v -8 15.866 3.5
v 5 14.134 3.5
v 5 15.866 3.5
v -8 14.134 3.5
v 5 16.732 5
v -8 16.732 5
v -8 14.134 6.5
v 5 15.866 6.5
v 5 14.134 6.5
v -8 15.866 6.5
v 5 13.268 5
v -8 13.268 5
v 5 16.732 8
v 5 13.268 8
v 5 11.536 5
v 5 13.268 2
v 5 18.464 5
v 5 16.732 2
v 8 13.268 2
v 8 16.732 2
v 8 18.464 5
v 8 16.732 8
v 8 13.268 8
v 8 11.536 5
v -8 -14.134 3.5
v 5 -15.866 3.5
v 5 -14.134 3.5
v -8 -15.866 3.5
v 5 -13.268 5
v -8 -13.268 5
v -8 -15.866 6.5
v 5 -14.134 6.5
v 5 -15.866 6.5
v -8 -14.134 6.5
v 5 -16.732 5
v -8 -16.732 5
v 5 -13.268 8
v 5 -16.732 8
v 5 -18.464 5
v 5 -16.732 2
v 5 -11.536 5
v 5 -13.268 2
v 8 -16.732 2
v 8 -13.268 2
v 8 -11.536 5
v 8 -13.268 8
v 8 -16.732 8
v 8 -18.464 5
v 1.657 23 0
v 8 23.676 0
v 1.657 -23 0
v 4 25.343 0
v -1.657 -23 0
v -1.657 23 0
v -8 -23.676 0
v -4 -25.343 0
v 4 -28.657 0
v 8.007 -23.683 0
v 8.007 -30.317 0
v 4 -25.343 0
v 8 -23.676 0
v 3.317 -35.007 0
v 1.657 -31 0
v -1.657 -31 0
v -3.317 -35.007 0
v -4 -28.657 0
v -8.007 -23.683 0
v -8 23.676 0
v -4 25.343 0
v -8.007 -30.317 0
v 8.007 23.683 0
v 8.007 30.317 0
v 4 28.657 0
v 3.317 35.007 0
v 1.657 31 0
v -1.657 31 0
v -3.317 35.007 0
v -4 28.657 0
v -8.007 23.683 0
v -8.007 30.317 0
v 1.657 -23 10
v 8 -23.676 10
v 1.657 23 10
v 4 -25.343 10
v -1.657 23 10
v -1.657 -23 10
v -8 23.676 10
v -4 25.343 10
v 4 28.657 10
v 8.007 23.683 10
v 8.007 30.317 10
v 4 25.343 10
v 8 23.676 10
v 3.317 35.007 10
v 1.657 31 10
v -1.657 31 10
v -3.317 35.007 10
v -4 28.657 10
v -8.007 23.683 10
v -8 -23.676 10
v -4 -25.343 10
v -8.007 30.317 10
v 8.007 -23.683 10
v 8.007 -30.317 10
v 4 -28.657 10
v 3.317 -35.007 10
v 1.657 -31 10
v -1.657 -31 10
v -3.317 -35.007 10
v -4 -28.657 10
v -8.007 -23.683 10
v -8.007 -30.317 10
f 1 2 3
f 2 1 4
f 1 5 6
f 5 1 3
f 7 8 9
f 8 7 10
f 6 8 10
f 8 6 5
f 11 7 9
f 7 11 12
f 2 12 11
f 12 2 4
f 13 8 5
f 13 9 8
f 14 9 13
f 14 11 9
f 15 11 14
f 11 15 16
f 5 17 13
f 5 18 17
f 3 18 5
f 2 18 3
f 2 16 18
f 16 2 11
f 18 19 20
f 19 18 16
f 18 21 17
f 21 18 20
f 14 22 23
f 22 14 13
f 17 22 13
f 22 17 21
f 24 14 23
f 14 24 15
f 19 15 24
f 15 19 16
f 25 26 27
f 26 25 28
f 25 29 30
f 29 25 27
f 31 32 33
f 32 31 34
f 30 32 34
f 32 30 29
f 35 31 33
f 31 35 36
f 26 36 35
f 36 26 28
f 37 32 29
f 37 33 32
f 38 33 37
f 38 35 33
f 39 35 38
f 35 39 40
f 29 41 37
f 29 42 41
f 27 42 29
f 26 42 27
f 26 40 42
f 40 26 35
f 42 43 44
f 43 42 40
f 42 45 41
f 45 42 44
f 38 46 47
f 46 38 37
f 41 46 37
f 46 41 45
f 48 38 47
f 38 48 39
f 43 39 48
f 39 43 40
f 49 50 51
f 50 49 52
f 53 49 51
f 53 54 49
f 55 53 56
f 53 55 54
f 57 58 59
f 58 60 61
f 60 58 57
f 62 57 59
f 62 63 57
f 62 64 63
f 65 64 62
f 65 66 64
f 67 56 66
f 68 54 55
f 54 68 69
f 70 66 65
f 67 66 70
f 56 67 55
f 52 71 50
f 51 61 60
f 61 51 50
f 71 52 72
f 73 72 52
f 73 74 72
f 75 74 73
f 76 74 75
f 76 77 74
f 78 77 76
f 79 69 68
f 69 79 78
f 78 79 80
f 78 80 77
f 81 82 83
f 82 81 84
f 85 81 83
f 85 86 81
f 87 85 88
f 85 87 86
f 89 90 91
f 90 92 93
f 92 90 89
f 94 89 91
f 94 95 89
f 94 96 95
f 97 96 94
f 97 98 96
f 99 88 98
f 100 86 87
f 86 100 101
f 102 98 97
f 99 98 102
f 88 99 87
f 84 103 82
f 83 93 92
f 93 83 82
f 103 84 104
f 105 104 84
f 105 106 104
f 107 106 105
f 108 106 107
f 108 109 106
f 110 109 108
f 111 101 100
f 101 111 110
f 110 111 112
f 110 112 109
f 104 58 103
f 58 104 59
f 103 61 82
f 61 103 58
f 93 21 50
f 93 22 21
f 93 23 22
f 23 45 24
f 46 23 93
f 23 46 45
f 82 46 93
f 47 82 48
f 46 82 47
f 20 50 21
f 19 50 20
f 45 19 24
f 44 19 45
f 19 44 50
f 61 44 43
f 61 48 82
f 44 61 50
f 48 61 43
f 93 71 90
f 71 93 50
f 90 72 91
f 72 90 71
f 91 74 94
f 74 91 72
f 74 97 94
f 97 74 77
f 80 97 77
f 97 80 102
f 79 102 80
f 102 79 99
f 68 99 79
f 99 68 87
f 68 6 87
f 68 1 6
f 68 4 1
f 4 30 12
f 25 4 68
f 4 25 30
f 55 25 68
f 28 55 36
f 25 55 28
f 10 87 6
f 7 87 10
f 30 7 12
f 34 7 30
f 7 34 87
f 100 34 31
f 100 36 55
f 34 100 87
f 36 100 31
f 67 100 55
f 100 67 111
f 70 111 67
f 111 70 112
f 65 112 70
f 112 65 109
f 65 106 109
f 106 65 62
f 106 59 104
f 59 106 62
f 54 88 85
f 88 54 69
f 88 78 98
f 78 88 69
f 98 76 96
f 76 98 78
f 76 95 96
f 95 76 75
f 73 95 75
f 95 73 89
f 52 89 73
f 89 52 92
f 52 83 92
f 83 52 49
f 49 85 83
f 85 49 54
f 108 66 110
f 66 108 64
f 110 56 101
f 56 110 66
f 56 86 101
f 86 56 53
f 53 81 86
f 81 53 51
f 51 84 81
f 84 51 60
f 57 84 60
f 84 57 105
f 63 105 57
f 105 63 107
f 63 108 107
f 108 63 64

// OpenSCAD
// file: base_end_2off.scad
include <settings.scad>;

!base_end();

module base_end() difference() {
	linear_extrude(height = end_height, convexity = 5) difference() {
		square([yz_motor_distance + motor_casing - motor_screw_spacing + 10, motor_casing + rod_size * 4], center = true);
		for(end = [1, -1]) {
			for(side = [1, -1]) translate([end * (yz_motor_distance + motor_casing - motor_screw_spacing) / 2, side * motor_screw_spacing / 2, 0]) circle(m3_size * da6, $fn = 6);
			translate([end * (yz_motor_distance + motor_casing) / 2, 0, 0]) circle(motor_screw_spacing / 2);
		}
	}
	for(end = [1, -1]) translate([end * (yz_motor_distance + motor_casing) / 2, 0, 3]) linear_extrude(height = end_height, convexity = 5) square(motor_casing, center = true);
	for(side = [1, -1]) translate([0, side * (motor_casing / 2 + rod_size), rod_size / 2 + bearing_size / 2]) rotate([90, 180 / 8, 90]) {
		cylinder(r = rod_size * da8, h = yz_motor_distance + motor_casing + 20, center = true, $fn = 8);
		%translate([0, 0, -70]) cylinder(r = rod_size * da8, h = 200, center = true, $fn = 8);
	}
	translate([0, 0, end_height]) scale([1, 1, .5]) rotate([90, 0, 90]) cylinder(r = motor_casing / 2, h = yz_motor_distance + 20, center = true);
	translate([yz_motor_distance / 2 - rod_size, 0, 0]) {
		translate([0, 0, -3]) linear_extrude(height = end_height - motor_casing / 4, convexity = 5) {
			rotate(180 / 8) circle(rod_size * da8, $fn = 8);
			translate([0, -rod_size / 4, 0]) square([rod_size * .6, rod_size / 2]);
		}
		// z axis clamping
		for(h = [8, end_height - motor_casing / 4 - 8]) translate([0, 0, h]) rotate([90, 0, 90]) {
			cylinder(r = m3_size * da6, h = yz_motor_distance + motor_casing, center = true, $fn = 6);
			translate([0, 0, -rod_size / 2 - 3]) cylinder(r = m3_nut_size* da6, h = yz_motor_distance + motor_casing, $fn = 6);
			translate([0, 0, 0]) cylinder(r = m3_nut_size / 2 + 0.5, h = yz_motor_distance + motor_casing, $fn = 6);
			translate([0, 0, -rod_size / 2 - 8]) rotate([0, 180, 0]) cylinder(r = m3_size * da6 * 2, h = yz_motor_distance + motor_casing, $fn = 6);
		}
	}
	translate([-yz_motor_distance / 2 + bearing_size / 2, 0, -bearing_size * sqrt(2) / 4]) rotate([90, -45, 0]) {
		%cylinder(r = rod_size * da8, h = 100, center = true, $fn = 8);
		for(side = [0, 1]) mirror([0, 0, side]) translate([0, 0, rod_size / 2 + 2]) {
			cylinder(r = bearing_size / 2, h = bearing_length, center = false, $fn = 80);
			cube([bearing_size / 2, bearing_size / 2, bearing_length]);
		}
	}
	translate([0, 0, end_height - rod_size * 1.5]) rotate([90, 180 / 8, 0]) cylinder(r = rod_size * da8, h = motor_casing + rod_size * 5, $fn = 8, center = true);
	%translate([0, 0, end_height - rod_size * 1.5]) rotate([90, 180 / 8, 0]) cylinder(r = rod_size * da8, h = 100, $fn = 8, center = true);
}
// file: y_bearing_retainers.scad
include <settings.scad>;

!for(b = [0:1]) mirror([0, b, 0]) for(a = [-1,1]) translate([a * bearing_size / 4, bearing_size - (bearing_size * 2/3) * a, 0]) rotate(90 + 90 * a) y_bearing_retainer();

module y_bearing_retainer() intersection() {
	difference() {
		linear_extrude(height = 10, convexity = 5) difference() {
			union() {
				intersection() {
					translate([-yz_motor_distance / 2 + bearing_size / 2, 0, 0]) circle(bearing_size / 2 + 4);
					translate([-yz_motor_distance / 2 + bearing_size / 2 - bearing_size / 2 - 4, -bearing_size, 0]) square([bearing_size + 8, bearing_size]);
				}
				translate([-yz_motor_distance / 2 + bearing_size / 2 - bearing_size / 2 - 4, 0, 0]) square([bearing_size + 8, bearing_size * sqrt(2) / 4 - 1]);
				translate([0, bearing_size * sqrt(2) / 4 - 3, 0]) square([yz_motor_distance + motor_casing - motor_screw_spacing + 10, 4], center = true);
			}
			translate([-yz_motor_distance / 2 + bearing_size / 2, 0, 0]) circle(bearing_size / 2);
			translate([-yz_motor_distance / 2 + bearing_size / 2 - bearing_size / 2, 0, 0]) square(bearing_size);
		}
		//screw holes
		for(side = [1, -1]) translate([side * (yz_motor_distance + motor_casing - motor_screw_spacing) / 2, 0, 5]) rotate(90) rotate([90, 0, 90]) {
			cylinder(r = m3_size * da6, h = bearing_size, center = true, $fn = 6);
			translate([0, 0, bearing_size * sqrt(2) / 4 - 5]) rotate([180, 0, 0]) cylinder(r = m3_size, h = bearing_size, $fn = 30);
		}
	}
	translate([0, 0, 5]) rotate(90) rotate([90, 0, 90]) cylinder(r = (yz_motor_distance + motor_casing - motor_screw_spacing + 10) / 2, h = bearing_size + 10, center = true, $fn = 6);
}
// file: bed_mounts.scad
include <settings.scad>;

!for(b = [0:1]) mirror([0, b, 0]) for(a = [-1,1]) translate([a * -7.5, 18 - 5 * a, 0]) rotate(180 + 90 * a) bed_mount();

module bed_mount() difference() {
	linear_extrude(height = 10, convexity = 5) difference() {
		union() {
			rotate(180 / 8) circle((rod_size + 8) * da8, $fn = 8);
			translate([0, -rod_size / 2 - 4, 0]) square([rod_size / 2 + 8, max(rod_size + 8, rod_size / 2 + 4 + bed_mount_height)]);
		}
		rotate(180 / 8) circle(rod_size * da8, $fn = 8);
		translate([0, -rod_size / (1 + sqrt(2)) / 2, 0]) square([rod_size + 10, rod_size / (1 + sqrt(2))]);
	}
	translate([rod_size / 2 + 1.5, -rod_size / 2 - 6, 5]) rotate([-90, 0, 0]) {
		cylinder(r = m3_size * da6, h = max(rod_size + 12, rod_size / 2 + 7 + bed_mount_height, $fn = 6));
		cylinder(r = m3_nut_size * da6, h = 4, $fn = 6);
	}
}
// file: x_end_left.scad
include <settings.scad>;

!x_end(0);

module x_end(motor = 0) mirror([(motor == 0) ? 1 : 0, 0, 0]) difference() {
	union() {
		if(motor > 0) translate([-(motor_casing / 2 + rod_size + bearing_size + 8) / 2 - motor_casing, 8 + rod_size, 0]) rotate([90, 0, 0]) {
			// Motor holder
			linear_extrude(height = 7) difference() {
				square([motor_casing + 3, x_rod_spacing + 8 + rod_size]);
				translate([motor_casing / 2, (x_rod_spacing + 8 + rod_size) / 2, 0]) {
					circle(motor_screw_spacing / 2);
					for(x = [1, -1]) for(y = [1, -1]) translate([x * motor_screw_spacing / 2, y * motor_screw_spacing / 2, 0]) circle(m3_size * da6, $fn = 6);
					translate([-(motor_casing * 1.5 - motor_screw_spacing), (motor > 1) ? (motor_casing / 2 - motor_screw_spacing) : 0, 0]) square([motor_casing, x_rod_spacing + 8 + rod_size]);
				}
			}
			// Belt
			%translate([motor_casing / 2, (x_rod_spacing + 8 + rod_size) / 2, rod_size / 2 - 2 - bearing_size / 2 - 2 - idler_pulley_width / 2]) rotate([180, 0, 0]) linear_extrude(height = 5, convexity = 5) difference() {
				union() {
					circle(pulley_size / 2 + 2);
					translate([0, -pulley_size / 2 - 2, 0]) square([200.5, pulley_size + 4]);
					translate([200.5, 0, 0]) circle(pulley_size / 2 + 2);
				}
				circle(pulley_size / 2);
				translate([0, -pulley_size / 2, 0]) square([200.5, pulley_size]);
				translate([200.5, 0, 0]) circle(pulley_size / 2);
			}

		}
		linear_extrude(height = x_rod_spacing + 8 + rod_size, convexity = 5) difference() {
			union() {
				for(side = [1, -1]) translate([side * (motor_casing / 4 + rod_size / 2), 0, 0]) circle(bearing_size / 2 + 3, $fn = 30);
				square([motor_casing / 2 + rod_size, bearing_size / 2 + 3], center = true);
				translate([-(motor_casing / 2 + rod_size + bearing_size + 6) / 2, 0, 0]) square([(motor_casing / 2 + rod_size + bearing_size / 2 + 3 + 3) / 2, bearing_size / 2 + 4 + rod_size / 2]);
				translate([-(motor_casing / 2 + rod_size + bearing_size + 6) / 2, 0, 0]) square([motor_casing / 2 + rod_size + bearing_size / 2 + 3 + 3, bearing_size / 2 + 3 + rod_size / 2]);
				translate([-(motor_casing / 2 + rod_size + bearing_size + 6) / 2 + rod_size / 2 + 2, 0, 0]) square([(motor_casing / 2 + rod_size + bearing_size + 6) / 2 + 5 - rod_size / 2 - 2, bearing_size / 2 + 6 + rod_size]);
				translate([-(motor_casing / 2 + rod_size + bearing_size + 6) / 2 + rod_size / 2 + 2, bearing_size / 2 + rod_size / 2 + 4, 0]) circle(rod_size / 2 + 2);
				translate([0, bearing_size / 2 + rod_size + 6, 0]) square(10, center = true);
			}
			square([motor_casing / 2 + rod_size, 3], center = true);
			translate([(motor_casing / 4 + rod_size / 2), 0, 0]) circle(bearing_size / 2 - .5, $fn = 30);
			translate([-(motor_casing / 4 + rod_size / 2), 0, 0]) circle(rod_nut_size * 6/14, $fn = 6);
			translate([4 + rod_size / 2, bearing_size / 2 + rod_size / 2 + 3, 0]) {
				square([motor_casing / 2 + rod_size + bearing_size + 8, rod_size / 2], center = true);
				translate([-(motor_casing / 2 + rod_size + bearing_size + 8) / 2, .5, 0]) circle(rod_size / 4 + .5, $fn = 12);
			}
		}
	}
	translate([0, 0, (x_rod_spacing + rod_size + 8) / 2]) {
		for(end = [0, 1]) mirror([0, 0, end]) translate([motor_casing / 4 + rod_size / 2, 0, -(x_rod_spacing + rod_size + 8) / 2 - 1]) cylinder(r = bearing_size / 2 - .05, h = bearing_length, $fn = 30);
		for(side = [1, -1]) render(convexity = 5) translate([0, bearing_size / 2 + rod_size / 2 + 3, side * x_rod_spacing / 2]) rotate([0, 90, 0]) {
			//cylinder(r = rod_size / 2, h = motor_casing / 2 + rod_size + bearing_size + 10, center = true, $fn = 30);
			difference() {
				translate([0, 0, (motor > -1) ? rod_size / 2 + 2 : 0]) intersection() {
					rotate(45) cube([rod_size + 2, rod_size + 2, motor_casing / 2 + rod_size + bearing_size + 10], center = true);
					cube([rod_size * 2, rod_size + 2, motor_casing / 2 + rod_size + bearing_size + 10], center = true);
				}
				translate([0, rod_size, 0]) cube([rod_size * 2, rod_size * 2, 6], center = true);
				for(end = [1, -1]) translate([0, -rod_size, end * (motor_casing / 4 + rod_size / 2)]) cube([rod_size * 2, rod_size * 2, 6], center = true);
			}
			translate([0, 0, rod_size / 2 + 2]) intersection() {
				rotate(45) cube([rod_size, rod_size, motor_casing / 2 + rod_size + bearing_size + 10], center = true);
				cube([rod_size * 2, rod_size + 1, motor_casing / 2 + rod_size + bearing_size + 10], center = true);
			}
		}
		// holes for clamping screws
		rotate([90, 0, 0]) {
			cylinder(r = m3_size * da6, h = 100, center = true, $fn = 6);
			translate([0, 0, bearing_size / 4 + .5]) cylinder(r = m3_nut_size * da6, h = 100, center = false, $fn = 6);
		}
	}
	translate([-(motor_casing / 4 + rod_size / 2), 0, 5]) rotate(90) cylinder(r = rod_nut_size / 2, h = x_rod_spacing + 8 + rod_size, $fn = 6);
	translate([(motor_casing / 4 + rod_size / 2), 0, 5]) %rotate(180 / 8) cylinder(r = rod_size * da8, h = 200, center = true, $fn = 8);
}
// file: x_carriage.scad
include <settings.scad>;

!x_carriage();

module x_carriage() difference() {
	intersection() {
		linear_extrude(height = x_carriage_width, convexity = 5) difference() {
			union() {
				square([bearing_size + 8, x_rod_spacing], center = true);
				translate([0, -x_rod_spacing / 2 - bearing_size / 2 - 4, 0]) square([bearing_size / 2 + 4 + 15, x_rod_spacing / 2 + bearing_size / 2 + 4 - 2 - pulley_size / 2]);
				translate([0, -pulley_size / 2, 0]) {
					square([bearing_size / 2 + 4 + 15, 8]);
					translate([bearing_size / 2 + 4 + 15, 4, 0]) circle(4);
				}
				rotate(180) translate([0, -x_rod_spacing / 2 - bearing_size / 2 - 4, 0]) square([bearing_size / 2 + 4 + 28, bearing_size / 2 + 4 + 3]);
				for(side = [1, -1]) translate([0, side * x_rod_spacing / 2, 0]) circle(bearing_size / 2 + 4, $fn = 30);
			}
			translate([bearing_size / 2 + 4, 2 - pulley_size / 2, 0]) {
				square([15, 4]);
				translate([0, -3, 0]) square([2, 4]);
				translate([15, 2, 0]) circle(2);
			}
			for(side = [1, -1]) translate([0, side * x_rod_spacing / 2, 0]) {
				circle(bearing_size / 2 -1, $fn = 30);
				rotate(90 * side) square([2, bearing_size / 2 + 40]);
			}
		}
		difference() {
			rotate([0, -90, 0]) linear_extrude(height = bearing_size + 100, convexity = 5, center = true) difference() {
				polygon([
					[
						0,
						(x_rod_spacing / 2 + bearing_size / 2 + 4)
					],[
						0,
						-(x_rod_spacing / 2 + bearing_size / 2 + 4)
					],[
						bearing_length + 4,
						-(x_rod_spacing / 2 + bearing_size / 2 + 4)
					],[
						bearing_length + 4,
						-(x_rod_spacing / 2 - bearing_size / 2 - 4)
					],[
						x_carriage_width,
						(x_rod_spacing / 2 - bearing_size / 2 - 4)
					],[
						x_carriage_width,
						(x_rod_spacing / 2 + bearing_size / 2 + 4)
					]
				]);
			}
			translate([bearing_size / 2 + 4, -50, bearing_length + 4]) cube(100);
		}
	}
	// linear bearings
	translate([0, x_rod_spacing / 2, 0]) rotate([0, 0, 0]) {
		%translate([0, 0, 20]) rotate(180 / 8) cylinder(r = rod_size * da8, h = 200, center = true, $fn = 8);
		for(end = [0, 1]) mirror([0, 0, end]) translate([0, 0, end * -x_carriage_width - 1]) cylinder(r = bearing_size / 2, h = bearing_length, $fn = 30);
	}
	translate([0, -x_rod_spacing / 2, 0]) rotate([0, 0, 0]) {
		translate([0, 0, 4]) cylinder(r = bearing_size / 2, h = x_carriage_width + 1, center = false, $fn = 30);
		%translate([0, 0,20]) rotate(180 / 8) cylinder(r = rod_size * da8, h = 200, center = true, $fn = 8);
	}
	// screw holes
	translate([bearing_size / 2 + 4 + 10, 5 - pulley_size / 2, bearing_length / 2 + 2]) rotate([90, 0, 0]) {
		cylinder(r = m3_size * da6, h = x_rod_spacing + bearing_size + 10, center = true, $fn = 6);
		rotate([180, 0, 0]) cylinder(r = m3_size * da6 * 2, h = x_rod_spacing + bearing_size + 10, center = false, $fn = 6);
		translate([0, 0, x_rod_spacing / 2 + bearing_size / 2 + 6 - pulley_size / 2]) cylinder(r = m3_nut_size * da6, h = x_rod_spacing + bearing_size + 10, center = false, $fn = 6);
	}
	//#for(side = [1, -1]) translate([-bearing_size / 2 - 4 - 14, 0, x_carriage_width / 2 + carriage_extruder_offset + side * 25]) rotate([90, 0, 0]) cylinder(r = 4.1, h = x_rod_spacing - 10, center = true, $fn = 6);
	translate([-bearing_size / 2 - 4 - 14, 0, x_carriage_width / 2 + carriage_extruder_offset]) rotate([90, 0, 0]) linear_extrude(height = bearing_size + x_rod_spacing + 10, center = true, convexity = 5) {
		*translate([-14, 0, 0]) {
			circle(20);
			rotate(45) square(5);
		}
		intersection() {
			translate([18, 0, 0]) rotate(135) square(100);
			translate([-14, 0, 0]) square([56, 100], center = true);
		}
		for(side = [1, -1]) translate([0, side * 25, 0]) circle(m4_size * da6, $fn = 6);
	}
}
// file: leadscrew_couplers.scad
include <wallace.scad>;

!for(side = [-1,1]) translate([0, side * motor_screw_spacing / 2, 0]) leadscrew_coupler();

module leadscrew_coupler() difference() {
	linear_extrude(height = 10 + rod_nut_size / 2 + 1, convexity = 5) difference() {
		circle(motor_screw_spacing / 2 - 1);
		circle(motor_shaft_size * da6, $fn = 6);
	}
	translate([0, 0, m3_nut_size / 2]) rotate([-90, 0, 90]) {
		cylinder(r = m3_size * da6, h = motor_screw_spacing / 2 + 1);
		%rotate(90) cylinder(r = m3_nut_size / 2, h = 5.5, $fn = 6);
		translate([0, 0, 12]) cylinder(r = m3_size * da6 * 2, h = motor_screw_spacing / 2);
		translate([-m3_nut_size / da6 / 4, -m3_nut_size / 2, 0]) cube([m3_nut_size / da6 / 2, m3_nut_size + 1, 5.7]);
	}
	translate([0, 0, 10]) cylinder(r = rod_nut_size / 2, h = rod_nut_size + 1, $fn = 6);
	//translate([0, 0, -1]) cube(100);
}
// file: idler_pulleys.scad
include <wallace.scad>;

!for(x = [1, -1]) for(y = [1, -1]) translate([x * (pulley_size / 2 + 3), y * (pulley_size / 2 + 3), 0]) idler_pulley(true);

module idler_pulley(double_bearing = true) difference() {
	intersection() {
		linear_extrude(height = idler_pulley_width + 1, convexity = 5) difference() {
			circle(pulley_size / 2 + 2);
			circle(5, $fn = 4);
		}
		union() {
			translate([0, 0, idler_pulley_width / 2 + 1]) scale([1, 1, 1.25]) sphere(pulley_size / 2);
			cylinder(r = pulley_size / 2 + 5, h = 1);
		}
	}
	for(h = [-idler_pulley_width + 4, idler_pulley_width * 2 + 1 - 4]) rotate(180 / 8) translate([0, 0, (double_bearing) ? h:0]) cylinder(r = 10 * da8, h = idler_pulley_width * 2, center = true, $fn = 8);
}
// file: feet.scad
include <settings.scad>;

!for(x = [1, -1]) for(y = [1, -1]) translate([x * (rod_size * 1.5 + 2), y * (rod_size * 1.5 + 2), 0]) foot();

module foot() difference() {
	linear_extrude(height = rod_size, convexity = 5) difference() {
		minkowski() {
			square(rod_size + 2, center = true);
			circle(rod_size, $fn = 16);
		}
		circle(rod_size / 2, $fn = 12);
	}
	translate([0, 0, -rod_size / 16]) cylinder(r1 = rod_size * 3/4, r2 = rod_size / 4, h = rod_size / 2, $fn = 12);
	translate([0, 0, rod_size / 2 + rod_size / 16]) cylinder(r2 = rod_size * 3/4, r1 = rod_size / 4, h = rod_size / 2, $fn = 12);
}
// file: z_top_clamps.scad
include <settings.scad>;

!for(side = [0, 1]) mirror([side, 0, 0]) translate([-rod_size * 2.5, 0, 0]) z_top_clamp();

module z_top_clamp() difference() {
	union() {
		linear_extrude(height = rod_size * 2 + gusset_size, convexity = 5) difference() {
			union() {
				circle(r = rod_size * da6 * 2, $fn = 6);
				translate([0, -rod_size, 0]) square([rod_size * (1 + da6), rod_size * 2]);
				translate([rod_size - rod_size * da6, rod_size / 2, rod_size]) square([rod_size * da6 * 2, rod_size / 2 + gusset_size]);
			}
		}
		translate([rod_size, -rod_size - 1, rod_size]) rotate([-90, 0, 0]) cylinder(r = rod_size / cos(180 / 6), h = rod_size * 2 + gusset_size + 2, $fn = 6);
	}
	translate([rod_size, -rod_size - 2, rod_size]) rotate([-90, 0, 0]) cylinder(r = rod_size * da6, h = gusset_size + rod_size * 2 + 4, $fn = 6);
	translate([rod_size, rod_size + gusset_size, rod_size * 2 + gusset_size]) rotate([45, 0, 0]) cube([rod_size * 2, gusset_size * sqrt(2), gusset_size * sqrt(2)], center = true);
	translate([0, 0, -1]) linear_extrude(height = rod_size * 2 + gusset_size + 2, convexity = 5) {
		circle(r = rod_size * da6, $fn = 6);
		%translate([rod_size, -10, rod_size * da6 * 2]) rotate([-90, 0, 0]) cylinder(r = rod_size * da6, h = 160, $fn = 6);
		translate([0, -rod_size / 2, 0]) square([gusset_size + rod_size * 2 + 1, rod_size]);
	}
}
// file: settings.scad
rod_size = 8;
rod_nut_size = 15; //12 for M6, 15 for M8
bearing_size = 15.5; //12.5 for LM6UU, 15.5 for LM8UU,LM8SUU
bearing_length = 24.5; //19.5 for LM6UU, 17.5 for LM8SUU, 24.5 for LM8UU
yz_motor_distance = 25;
motor_screw_spacing = 26; //26 for NEMA14, 31 for NEMA17
motor_casing = 38; //38 for NEMA14, 45 for NEMA17
end_height = 40; //measure the height of your motor casing and add 4mm. Suggestion: 40 for NEMA14, 55 for NEMA17
bed_mount_height = 16;
//x_rod_spacing = motor_screw_spacing + 3 + rod_size;
x_rod_spacing = 30;
x_carriage_width = 70;
carriage_extruder_offset = 5;
pulley_size = 20;
idler_pulley_width = 10;
gusset_size = 15;
m3_size = 3;
m3_nut_size = 6;
m4_size = 4;
motor_shaft_size = 5;

// ratio for converting diameter to apothem
da6 = 1 / cos(180 / 6) / 2;
da8 = 1 / cos(180 / 8) / 2;
// file: wallace.scad
include <settings.scad>;

//modules
use <z_top_clamps.scad>;
use <feet.scad>;
use <idler_pulleys.scad>;
use <y_idler.scad>;
use <leadscrew_couplers.scad>;
use <x_carriage.scad>;
use <x_end_left.scad>;
//use <x_end_right.scad>;
use <bed_mounts.scad>;
use <y_bearing_retainers.scad>;
use <base_end_2off.scad>;


//The following section positions parts for rendering the assembled machine.

	translate([0, 0, -bearing_size]) rotate([0, 180, 0]) base_end();
	for(end = [1, -1]) translate([0, end * motor_screw_spacing / 2 + 5, -bearing_size + bearing_size * sqrt(2) / 4]) rotate([-90, 0, 180]) y_bearing_retainer();
	for(side = [0, 1]) mirror([0, side, 0]) translate([yz_motor_distance / 2 - bearing_size / 2, -motor_casing / 2 - rod_size * 2 - 10, -bearing_size + bearing_size * sqrt(2) / 4]) rotate([90, 0, 0]) bed_mount();
	translate([-yz_motor_distance / 2 + rod_size - motor_casing / 4 - rod_size / 2, 0, 60 + (x_rod_spacing + 8 + rod_size) / 2]) rotate([0, 180, 0]) x_end(0);
	translate([140, 0, 60 + (x_rod_spacing + 8 + rod_size) / 2]) rotate([0, 180, 0]) {
		x_end(2);
		translate([0, 8 + rod_size, 0]) rotate([90, 0, 0]) translate([0, (x_rod_spacing + 8 + rod_size) / 2, rod_size / 2 - 2 - bearing_size / 2 - 4 - idler_pulley_width - 1.5]) idler_pulley(true);
	}
	translate([40, rod_size + bearing_size / 2 + 1 - rod_size / 2 + 2, 60]) {
		rotate([90, 0, 90]) x_carriage();
		translate([x_carriage_width / 2 + carriage_extruder_offset, -14 - bearing_size / 2 - 4, x_rod_spacing / 2 + bearing_size / 2 + 4]) {
			rotate([90, 0, 180]) translate([10.57, 30.3, -14]) import("gregs/gregs_accessible_wade-wildseyed_mount.stl", convexity = 5);
			%rotate(180 / 8) cylinder(r = 2, h = 150, center = true, $fn = 8);
		}
	}
	translate([-yz_motor_distance / 2 - motor_casing / 2, 0, -bearing_size / 2]) leadscrew_coupler();
	translate([60, 0, -bearing_size - rod_size / 2 - bearing_size / 2]) {
		rotate([0, 90, 0]) y_idler();
		for(side = [1, -1]) translate([5, side * (motor_casing / 2 - rod_size / 2), idler_pulley_width + 1.5 + rod_size]) rotate([180, 0, 0]) idler_pulley(true);
	}
	for(side = [0, 1]) mirror([0, side, 0]) translate([0, -motor_casing / 2 - rod_size * 2 - 10, -bearing_size - end_height + rod_size * 1.5]) rotate([90, 0, 0]) foot();
	translate([-yz_motor_distance / 2 + rod_size, 0, 210 - end_height]) rotate([180, 0, 90]) z_top_clamp(0);
// main file
include <wallace.scad>;

!y_idler();

module y_idler() difference() {
	linear_extrude(height = 10, convexity = 5) difference() {
		union() {
			square([rod_size * 2, motor_casing + rod_size * 2], center = true);
			for(side = [1, -1]) translate([0, side * (motor_casing / 2 + rod_size), rod_size / 2 + bearing_size / 2]) rotate(180 / 8) circle(rod_size * 13/12, h = yz_motor_distance + motor_casing + 20, center = true, $fn = 8);
		}
		for(side = [1, -1]) translate([0, side * (motor_casing / 2 + rod_size), rod_size / 2 + bearing_size / 2]) rotate(180 / 8) circle(rod_size * da8, h = yz_motor_distance + motor_casing + 20, center = true, $fn = 8);

	}
	rotate([90, 0, 90]) {
		for(side = [1, -1]) translate([side * (motor_casing / 2 - rod_size / 2), 5, -3]) {
			cylinder(r = m3_size * da6, h = rod_size * 2, center = true, $fn = 6);
			translate([0, 0, rod_size]) cylinder(r = m3_nut_size * da6, h = 4, $fn = 6);
		}
		//belt
		%translate([0, 5, -rod_size - idler_pulley_width / 2]) linear_extrude(height = 5, center = true, convexity = 5) for(side = [1, 0]) mirror([side, 0, 0]) {
			translate([-(motor_casing / 2 - rod_size / 2), 0, 0]) {
				intersection() {
					difference() {
						circle(pulley_size / 2 + 2);
						circle(pulley_size / 2);
					}
					square(pulley_size);
				}
				rotate(90) difference() {
					translate([2, 0, 0]) square([pulley_size / 2, 40]);
					square([pulley_size / 2, 40]);
				}
				rotate(-90) difference() {
					translate([0, 2, 0]) square([60 - yz_motor_distance / 2 - motor_screw_spacing / 2, pulley_size / 2]);
					square([60, pulley_size / 2]);
				}
			}
			translate([0, -(60 - yz_motor_distance / 2 - motor_screw_spacing / 2), 0]) difference() {
				circle(motor_casing / 2 - rod_size / 2 - pulley_size / 2);
				circle(motor_casing / 2 - rod_size / 2 - pulley_size / 2 - 2);
				translate([-(motor_casing / 2 - rod_size / 2 - pulley_size / 2), 0, 0]) square(motor_casing - rod_size - pulley_size);
			}
		}
	}
}
